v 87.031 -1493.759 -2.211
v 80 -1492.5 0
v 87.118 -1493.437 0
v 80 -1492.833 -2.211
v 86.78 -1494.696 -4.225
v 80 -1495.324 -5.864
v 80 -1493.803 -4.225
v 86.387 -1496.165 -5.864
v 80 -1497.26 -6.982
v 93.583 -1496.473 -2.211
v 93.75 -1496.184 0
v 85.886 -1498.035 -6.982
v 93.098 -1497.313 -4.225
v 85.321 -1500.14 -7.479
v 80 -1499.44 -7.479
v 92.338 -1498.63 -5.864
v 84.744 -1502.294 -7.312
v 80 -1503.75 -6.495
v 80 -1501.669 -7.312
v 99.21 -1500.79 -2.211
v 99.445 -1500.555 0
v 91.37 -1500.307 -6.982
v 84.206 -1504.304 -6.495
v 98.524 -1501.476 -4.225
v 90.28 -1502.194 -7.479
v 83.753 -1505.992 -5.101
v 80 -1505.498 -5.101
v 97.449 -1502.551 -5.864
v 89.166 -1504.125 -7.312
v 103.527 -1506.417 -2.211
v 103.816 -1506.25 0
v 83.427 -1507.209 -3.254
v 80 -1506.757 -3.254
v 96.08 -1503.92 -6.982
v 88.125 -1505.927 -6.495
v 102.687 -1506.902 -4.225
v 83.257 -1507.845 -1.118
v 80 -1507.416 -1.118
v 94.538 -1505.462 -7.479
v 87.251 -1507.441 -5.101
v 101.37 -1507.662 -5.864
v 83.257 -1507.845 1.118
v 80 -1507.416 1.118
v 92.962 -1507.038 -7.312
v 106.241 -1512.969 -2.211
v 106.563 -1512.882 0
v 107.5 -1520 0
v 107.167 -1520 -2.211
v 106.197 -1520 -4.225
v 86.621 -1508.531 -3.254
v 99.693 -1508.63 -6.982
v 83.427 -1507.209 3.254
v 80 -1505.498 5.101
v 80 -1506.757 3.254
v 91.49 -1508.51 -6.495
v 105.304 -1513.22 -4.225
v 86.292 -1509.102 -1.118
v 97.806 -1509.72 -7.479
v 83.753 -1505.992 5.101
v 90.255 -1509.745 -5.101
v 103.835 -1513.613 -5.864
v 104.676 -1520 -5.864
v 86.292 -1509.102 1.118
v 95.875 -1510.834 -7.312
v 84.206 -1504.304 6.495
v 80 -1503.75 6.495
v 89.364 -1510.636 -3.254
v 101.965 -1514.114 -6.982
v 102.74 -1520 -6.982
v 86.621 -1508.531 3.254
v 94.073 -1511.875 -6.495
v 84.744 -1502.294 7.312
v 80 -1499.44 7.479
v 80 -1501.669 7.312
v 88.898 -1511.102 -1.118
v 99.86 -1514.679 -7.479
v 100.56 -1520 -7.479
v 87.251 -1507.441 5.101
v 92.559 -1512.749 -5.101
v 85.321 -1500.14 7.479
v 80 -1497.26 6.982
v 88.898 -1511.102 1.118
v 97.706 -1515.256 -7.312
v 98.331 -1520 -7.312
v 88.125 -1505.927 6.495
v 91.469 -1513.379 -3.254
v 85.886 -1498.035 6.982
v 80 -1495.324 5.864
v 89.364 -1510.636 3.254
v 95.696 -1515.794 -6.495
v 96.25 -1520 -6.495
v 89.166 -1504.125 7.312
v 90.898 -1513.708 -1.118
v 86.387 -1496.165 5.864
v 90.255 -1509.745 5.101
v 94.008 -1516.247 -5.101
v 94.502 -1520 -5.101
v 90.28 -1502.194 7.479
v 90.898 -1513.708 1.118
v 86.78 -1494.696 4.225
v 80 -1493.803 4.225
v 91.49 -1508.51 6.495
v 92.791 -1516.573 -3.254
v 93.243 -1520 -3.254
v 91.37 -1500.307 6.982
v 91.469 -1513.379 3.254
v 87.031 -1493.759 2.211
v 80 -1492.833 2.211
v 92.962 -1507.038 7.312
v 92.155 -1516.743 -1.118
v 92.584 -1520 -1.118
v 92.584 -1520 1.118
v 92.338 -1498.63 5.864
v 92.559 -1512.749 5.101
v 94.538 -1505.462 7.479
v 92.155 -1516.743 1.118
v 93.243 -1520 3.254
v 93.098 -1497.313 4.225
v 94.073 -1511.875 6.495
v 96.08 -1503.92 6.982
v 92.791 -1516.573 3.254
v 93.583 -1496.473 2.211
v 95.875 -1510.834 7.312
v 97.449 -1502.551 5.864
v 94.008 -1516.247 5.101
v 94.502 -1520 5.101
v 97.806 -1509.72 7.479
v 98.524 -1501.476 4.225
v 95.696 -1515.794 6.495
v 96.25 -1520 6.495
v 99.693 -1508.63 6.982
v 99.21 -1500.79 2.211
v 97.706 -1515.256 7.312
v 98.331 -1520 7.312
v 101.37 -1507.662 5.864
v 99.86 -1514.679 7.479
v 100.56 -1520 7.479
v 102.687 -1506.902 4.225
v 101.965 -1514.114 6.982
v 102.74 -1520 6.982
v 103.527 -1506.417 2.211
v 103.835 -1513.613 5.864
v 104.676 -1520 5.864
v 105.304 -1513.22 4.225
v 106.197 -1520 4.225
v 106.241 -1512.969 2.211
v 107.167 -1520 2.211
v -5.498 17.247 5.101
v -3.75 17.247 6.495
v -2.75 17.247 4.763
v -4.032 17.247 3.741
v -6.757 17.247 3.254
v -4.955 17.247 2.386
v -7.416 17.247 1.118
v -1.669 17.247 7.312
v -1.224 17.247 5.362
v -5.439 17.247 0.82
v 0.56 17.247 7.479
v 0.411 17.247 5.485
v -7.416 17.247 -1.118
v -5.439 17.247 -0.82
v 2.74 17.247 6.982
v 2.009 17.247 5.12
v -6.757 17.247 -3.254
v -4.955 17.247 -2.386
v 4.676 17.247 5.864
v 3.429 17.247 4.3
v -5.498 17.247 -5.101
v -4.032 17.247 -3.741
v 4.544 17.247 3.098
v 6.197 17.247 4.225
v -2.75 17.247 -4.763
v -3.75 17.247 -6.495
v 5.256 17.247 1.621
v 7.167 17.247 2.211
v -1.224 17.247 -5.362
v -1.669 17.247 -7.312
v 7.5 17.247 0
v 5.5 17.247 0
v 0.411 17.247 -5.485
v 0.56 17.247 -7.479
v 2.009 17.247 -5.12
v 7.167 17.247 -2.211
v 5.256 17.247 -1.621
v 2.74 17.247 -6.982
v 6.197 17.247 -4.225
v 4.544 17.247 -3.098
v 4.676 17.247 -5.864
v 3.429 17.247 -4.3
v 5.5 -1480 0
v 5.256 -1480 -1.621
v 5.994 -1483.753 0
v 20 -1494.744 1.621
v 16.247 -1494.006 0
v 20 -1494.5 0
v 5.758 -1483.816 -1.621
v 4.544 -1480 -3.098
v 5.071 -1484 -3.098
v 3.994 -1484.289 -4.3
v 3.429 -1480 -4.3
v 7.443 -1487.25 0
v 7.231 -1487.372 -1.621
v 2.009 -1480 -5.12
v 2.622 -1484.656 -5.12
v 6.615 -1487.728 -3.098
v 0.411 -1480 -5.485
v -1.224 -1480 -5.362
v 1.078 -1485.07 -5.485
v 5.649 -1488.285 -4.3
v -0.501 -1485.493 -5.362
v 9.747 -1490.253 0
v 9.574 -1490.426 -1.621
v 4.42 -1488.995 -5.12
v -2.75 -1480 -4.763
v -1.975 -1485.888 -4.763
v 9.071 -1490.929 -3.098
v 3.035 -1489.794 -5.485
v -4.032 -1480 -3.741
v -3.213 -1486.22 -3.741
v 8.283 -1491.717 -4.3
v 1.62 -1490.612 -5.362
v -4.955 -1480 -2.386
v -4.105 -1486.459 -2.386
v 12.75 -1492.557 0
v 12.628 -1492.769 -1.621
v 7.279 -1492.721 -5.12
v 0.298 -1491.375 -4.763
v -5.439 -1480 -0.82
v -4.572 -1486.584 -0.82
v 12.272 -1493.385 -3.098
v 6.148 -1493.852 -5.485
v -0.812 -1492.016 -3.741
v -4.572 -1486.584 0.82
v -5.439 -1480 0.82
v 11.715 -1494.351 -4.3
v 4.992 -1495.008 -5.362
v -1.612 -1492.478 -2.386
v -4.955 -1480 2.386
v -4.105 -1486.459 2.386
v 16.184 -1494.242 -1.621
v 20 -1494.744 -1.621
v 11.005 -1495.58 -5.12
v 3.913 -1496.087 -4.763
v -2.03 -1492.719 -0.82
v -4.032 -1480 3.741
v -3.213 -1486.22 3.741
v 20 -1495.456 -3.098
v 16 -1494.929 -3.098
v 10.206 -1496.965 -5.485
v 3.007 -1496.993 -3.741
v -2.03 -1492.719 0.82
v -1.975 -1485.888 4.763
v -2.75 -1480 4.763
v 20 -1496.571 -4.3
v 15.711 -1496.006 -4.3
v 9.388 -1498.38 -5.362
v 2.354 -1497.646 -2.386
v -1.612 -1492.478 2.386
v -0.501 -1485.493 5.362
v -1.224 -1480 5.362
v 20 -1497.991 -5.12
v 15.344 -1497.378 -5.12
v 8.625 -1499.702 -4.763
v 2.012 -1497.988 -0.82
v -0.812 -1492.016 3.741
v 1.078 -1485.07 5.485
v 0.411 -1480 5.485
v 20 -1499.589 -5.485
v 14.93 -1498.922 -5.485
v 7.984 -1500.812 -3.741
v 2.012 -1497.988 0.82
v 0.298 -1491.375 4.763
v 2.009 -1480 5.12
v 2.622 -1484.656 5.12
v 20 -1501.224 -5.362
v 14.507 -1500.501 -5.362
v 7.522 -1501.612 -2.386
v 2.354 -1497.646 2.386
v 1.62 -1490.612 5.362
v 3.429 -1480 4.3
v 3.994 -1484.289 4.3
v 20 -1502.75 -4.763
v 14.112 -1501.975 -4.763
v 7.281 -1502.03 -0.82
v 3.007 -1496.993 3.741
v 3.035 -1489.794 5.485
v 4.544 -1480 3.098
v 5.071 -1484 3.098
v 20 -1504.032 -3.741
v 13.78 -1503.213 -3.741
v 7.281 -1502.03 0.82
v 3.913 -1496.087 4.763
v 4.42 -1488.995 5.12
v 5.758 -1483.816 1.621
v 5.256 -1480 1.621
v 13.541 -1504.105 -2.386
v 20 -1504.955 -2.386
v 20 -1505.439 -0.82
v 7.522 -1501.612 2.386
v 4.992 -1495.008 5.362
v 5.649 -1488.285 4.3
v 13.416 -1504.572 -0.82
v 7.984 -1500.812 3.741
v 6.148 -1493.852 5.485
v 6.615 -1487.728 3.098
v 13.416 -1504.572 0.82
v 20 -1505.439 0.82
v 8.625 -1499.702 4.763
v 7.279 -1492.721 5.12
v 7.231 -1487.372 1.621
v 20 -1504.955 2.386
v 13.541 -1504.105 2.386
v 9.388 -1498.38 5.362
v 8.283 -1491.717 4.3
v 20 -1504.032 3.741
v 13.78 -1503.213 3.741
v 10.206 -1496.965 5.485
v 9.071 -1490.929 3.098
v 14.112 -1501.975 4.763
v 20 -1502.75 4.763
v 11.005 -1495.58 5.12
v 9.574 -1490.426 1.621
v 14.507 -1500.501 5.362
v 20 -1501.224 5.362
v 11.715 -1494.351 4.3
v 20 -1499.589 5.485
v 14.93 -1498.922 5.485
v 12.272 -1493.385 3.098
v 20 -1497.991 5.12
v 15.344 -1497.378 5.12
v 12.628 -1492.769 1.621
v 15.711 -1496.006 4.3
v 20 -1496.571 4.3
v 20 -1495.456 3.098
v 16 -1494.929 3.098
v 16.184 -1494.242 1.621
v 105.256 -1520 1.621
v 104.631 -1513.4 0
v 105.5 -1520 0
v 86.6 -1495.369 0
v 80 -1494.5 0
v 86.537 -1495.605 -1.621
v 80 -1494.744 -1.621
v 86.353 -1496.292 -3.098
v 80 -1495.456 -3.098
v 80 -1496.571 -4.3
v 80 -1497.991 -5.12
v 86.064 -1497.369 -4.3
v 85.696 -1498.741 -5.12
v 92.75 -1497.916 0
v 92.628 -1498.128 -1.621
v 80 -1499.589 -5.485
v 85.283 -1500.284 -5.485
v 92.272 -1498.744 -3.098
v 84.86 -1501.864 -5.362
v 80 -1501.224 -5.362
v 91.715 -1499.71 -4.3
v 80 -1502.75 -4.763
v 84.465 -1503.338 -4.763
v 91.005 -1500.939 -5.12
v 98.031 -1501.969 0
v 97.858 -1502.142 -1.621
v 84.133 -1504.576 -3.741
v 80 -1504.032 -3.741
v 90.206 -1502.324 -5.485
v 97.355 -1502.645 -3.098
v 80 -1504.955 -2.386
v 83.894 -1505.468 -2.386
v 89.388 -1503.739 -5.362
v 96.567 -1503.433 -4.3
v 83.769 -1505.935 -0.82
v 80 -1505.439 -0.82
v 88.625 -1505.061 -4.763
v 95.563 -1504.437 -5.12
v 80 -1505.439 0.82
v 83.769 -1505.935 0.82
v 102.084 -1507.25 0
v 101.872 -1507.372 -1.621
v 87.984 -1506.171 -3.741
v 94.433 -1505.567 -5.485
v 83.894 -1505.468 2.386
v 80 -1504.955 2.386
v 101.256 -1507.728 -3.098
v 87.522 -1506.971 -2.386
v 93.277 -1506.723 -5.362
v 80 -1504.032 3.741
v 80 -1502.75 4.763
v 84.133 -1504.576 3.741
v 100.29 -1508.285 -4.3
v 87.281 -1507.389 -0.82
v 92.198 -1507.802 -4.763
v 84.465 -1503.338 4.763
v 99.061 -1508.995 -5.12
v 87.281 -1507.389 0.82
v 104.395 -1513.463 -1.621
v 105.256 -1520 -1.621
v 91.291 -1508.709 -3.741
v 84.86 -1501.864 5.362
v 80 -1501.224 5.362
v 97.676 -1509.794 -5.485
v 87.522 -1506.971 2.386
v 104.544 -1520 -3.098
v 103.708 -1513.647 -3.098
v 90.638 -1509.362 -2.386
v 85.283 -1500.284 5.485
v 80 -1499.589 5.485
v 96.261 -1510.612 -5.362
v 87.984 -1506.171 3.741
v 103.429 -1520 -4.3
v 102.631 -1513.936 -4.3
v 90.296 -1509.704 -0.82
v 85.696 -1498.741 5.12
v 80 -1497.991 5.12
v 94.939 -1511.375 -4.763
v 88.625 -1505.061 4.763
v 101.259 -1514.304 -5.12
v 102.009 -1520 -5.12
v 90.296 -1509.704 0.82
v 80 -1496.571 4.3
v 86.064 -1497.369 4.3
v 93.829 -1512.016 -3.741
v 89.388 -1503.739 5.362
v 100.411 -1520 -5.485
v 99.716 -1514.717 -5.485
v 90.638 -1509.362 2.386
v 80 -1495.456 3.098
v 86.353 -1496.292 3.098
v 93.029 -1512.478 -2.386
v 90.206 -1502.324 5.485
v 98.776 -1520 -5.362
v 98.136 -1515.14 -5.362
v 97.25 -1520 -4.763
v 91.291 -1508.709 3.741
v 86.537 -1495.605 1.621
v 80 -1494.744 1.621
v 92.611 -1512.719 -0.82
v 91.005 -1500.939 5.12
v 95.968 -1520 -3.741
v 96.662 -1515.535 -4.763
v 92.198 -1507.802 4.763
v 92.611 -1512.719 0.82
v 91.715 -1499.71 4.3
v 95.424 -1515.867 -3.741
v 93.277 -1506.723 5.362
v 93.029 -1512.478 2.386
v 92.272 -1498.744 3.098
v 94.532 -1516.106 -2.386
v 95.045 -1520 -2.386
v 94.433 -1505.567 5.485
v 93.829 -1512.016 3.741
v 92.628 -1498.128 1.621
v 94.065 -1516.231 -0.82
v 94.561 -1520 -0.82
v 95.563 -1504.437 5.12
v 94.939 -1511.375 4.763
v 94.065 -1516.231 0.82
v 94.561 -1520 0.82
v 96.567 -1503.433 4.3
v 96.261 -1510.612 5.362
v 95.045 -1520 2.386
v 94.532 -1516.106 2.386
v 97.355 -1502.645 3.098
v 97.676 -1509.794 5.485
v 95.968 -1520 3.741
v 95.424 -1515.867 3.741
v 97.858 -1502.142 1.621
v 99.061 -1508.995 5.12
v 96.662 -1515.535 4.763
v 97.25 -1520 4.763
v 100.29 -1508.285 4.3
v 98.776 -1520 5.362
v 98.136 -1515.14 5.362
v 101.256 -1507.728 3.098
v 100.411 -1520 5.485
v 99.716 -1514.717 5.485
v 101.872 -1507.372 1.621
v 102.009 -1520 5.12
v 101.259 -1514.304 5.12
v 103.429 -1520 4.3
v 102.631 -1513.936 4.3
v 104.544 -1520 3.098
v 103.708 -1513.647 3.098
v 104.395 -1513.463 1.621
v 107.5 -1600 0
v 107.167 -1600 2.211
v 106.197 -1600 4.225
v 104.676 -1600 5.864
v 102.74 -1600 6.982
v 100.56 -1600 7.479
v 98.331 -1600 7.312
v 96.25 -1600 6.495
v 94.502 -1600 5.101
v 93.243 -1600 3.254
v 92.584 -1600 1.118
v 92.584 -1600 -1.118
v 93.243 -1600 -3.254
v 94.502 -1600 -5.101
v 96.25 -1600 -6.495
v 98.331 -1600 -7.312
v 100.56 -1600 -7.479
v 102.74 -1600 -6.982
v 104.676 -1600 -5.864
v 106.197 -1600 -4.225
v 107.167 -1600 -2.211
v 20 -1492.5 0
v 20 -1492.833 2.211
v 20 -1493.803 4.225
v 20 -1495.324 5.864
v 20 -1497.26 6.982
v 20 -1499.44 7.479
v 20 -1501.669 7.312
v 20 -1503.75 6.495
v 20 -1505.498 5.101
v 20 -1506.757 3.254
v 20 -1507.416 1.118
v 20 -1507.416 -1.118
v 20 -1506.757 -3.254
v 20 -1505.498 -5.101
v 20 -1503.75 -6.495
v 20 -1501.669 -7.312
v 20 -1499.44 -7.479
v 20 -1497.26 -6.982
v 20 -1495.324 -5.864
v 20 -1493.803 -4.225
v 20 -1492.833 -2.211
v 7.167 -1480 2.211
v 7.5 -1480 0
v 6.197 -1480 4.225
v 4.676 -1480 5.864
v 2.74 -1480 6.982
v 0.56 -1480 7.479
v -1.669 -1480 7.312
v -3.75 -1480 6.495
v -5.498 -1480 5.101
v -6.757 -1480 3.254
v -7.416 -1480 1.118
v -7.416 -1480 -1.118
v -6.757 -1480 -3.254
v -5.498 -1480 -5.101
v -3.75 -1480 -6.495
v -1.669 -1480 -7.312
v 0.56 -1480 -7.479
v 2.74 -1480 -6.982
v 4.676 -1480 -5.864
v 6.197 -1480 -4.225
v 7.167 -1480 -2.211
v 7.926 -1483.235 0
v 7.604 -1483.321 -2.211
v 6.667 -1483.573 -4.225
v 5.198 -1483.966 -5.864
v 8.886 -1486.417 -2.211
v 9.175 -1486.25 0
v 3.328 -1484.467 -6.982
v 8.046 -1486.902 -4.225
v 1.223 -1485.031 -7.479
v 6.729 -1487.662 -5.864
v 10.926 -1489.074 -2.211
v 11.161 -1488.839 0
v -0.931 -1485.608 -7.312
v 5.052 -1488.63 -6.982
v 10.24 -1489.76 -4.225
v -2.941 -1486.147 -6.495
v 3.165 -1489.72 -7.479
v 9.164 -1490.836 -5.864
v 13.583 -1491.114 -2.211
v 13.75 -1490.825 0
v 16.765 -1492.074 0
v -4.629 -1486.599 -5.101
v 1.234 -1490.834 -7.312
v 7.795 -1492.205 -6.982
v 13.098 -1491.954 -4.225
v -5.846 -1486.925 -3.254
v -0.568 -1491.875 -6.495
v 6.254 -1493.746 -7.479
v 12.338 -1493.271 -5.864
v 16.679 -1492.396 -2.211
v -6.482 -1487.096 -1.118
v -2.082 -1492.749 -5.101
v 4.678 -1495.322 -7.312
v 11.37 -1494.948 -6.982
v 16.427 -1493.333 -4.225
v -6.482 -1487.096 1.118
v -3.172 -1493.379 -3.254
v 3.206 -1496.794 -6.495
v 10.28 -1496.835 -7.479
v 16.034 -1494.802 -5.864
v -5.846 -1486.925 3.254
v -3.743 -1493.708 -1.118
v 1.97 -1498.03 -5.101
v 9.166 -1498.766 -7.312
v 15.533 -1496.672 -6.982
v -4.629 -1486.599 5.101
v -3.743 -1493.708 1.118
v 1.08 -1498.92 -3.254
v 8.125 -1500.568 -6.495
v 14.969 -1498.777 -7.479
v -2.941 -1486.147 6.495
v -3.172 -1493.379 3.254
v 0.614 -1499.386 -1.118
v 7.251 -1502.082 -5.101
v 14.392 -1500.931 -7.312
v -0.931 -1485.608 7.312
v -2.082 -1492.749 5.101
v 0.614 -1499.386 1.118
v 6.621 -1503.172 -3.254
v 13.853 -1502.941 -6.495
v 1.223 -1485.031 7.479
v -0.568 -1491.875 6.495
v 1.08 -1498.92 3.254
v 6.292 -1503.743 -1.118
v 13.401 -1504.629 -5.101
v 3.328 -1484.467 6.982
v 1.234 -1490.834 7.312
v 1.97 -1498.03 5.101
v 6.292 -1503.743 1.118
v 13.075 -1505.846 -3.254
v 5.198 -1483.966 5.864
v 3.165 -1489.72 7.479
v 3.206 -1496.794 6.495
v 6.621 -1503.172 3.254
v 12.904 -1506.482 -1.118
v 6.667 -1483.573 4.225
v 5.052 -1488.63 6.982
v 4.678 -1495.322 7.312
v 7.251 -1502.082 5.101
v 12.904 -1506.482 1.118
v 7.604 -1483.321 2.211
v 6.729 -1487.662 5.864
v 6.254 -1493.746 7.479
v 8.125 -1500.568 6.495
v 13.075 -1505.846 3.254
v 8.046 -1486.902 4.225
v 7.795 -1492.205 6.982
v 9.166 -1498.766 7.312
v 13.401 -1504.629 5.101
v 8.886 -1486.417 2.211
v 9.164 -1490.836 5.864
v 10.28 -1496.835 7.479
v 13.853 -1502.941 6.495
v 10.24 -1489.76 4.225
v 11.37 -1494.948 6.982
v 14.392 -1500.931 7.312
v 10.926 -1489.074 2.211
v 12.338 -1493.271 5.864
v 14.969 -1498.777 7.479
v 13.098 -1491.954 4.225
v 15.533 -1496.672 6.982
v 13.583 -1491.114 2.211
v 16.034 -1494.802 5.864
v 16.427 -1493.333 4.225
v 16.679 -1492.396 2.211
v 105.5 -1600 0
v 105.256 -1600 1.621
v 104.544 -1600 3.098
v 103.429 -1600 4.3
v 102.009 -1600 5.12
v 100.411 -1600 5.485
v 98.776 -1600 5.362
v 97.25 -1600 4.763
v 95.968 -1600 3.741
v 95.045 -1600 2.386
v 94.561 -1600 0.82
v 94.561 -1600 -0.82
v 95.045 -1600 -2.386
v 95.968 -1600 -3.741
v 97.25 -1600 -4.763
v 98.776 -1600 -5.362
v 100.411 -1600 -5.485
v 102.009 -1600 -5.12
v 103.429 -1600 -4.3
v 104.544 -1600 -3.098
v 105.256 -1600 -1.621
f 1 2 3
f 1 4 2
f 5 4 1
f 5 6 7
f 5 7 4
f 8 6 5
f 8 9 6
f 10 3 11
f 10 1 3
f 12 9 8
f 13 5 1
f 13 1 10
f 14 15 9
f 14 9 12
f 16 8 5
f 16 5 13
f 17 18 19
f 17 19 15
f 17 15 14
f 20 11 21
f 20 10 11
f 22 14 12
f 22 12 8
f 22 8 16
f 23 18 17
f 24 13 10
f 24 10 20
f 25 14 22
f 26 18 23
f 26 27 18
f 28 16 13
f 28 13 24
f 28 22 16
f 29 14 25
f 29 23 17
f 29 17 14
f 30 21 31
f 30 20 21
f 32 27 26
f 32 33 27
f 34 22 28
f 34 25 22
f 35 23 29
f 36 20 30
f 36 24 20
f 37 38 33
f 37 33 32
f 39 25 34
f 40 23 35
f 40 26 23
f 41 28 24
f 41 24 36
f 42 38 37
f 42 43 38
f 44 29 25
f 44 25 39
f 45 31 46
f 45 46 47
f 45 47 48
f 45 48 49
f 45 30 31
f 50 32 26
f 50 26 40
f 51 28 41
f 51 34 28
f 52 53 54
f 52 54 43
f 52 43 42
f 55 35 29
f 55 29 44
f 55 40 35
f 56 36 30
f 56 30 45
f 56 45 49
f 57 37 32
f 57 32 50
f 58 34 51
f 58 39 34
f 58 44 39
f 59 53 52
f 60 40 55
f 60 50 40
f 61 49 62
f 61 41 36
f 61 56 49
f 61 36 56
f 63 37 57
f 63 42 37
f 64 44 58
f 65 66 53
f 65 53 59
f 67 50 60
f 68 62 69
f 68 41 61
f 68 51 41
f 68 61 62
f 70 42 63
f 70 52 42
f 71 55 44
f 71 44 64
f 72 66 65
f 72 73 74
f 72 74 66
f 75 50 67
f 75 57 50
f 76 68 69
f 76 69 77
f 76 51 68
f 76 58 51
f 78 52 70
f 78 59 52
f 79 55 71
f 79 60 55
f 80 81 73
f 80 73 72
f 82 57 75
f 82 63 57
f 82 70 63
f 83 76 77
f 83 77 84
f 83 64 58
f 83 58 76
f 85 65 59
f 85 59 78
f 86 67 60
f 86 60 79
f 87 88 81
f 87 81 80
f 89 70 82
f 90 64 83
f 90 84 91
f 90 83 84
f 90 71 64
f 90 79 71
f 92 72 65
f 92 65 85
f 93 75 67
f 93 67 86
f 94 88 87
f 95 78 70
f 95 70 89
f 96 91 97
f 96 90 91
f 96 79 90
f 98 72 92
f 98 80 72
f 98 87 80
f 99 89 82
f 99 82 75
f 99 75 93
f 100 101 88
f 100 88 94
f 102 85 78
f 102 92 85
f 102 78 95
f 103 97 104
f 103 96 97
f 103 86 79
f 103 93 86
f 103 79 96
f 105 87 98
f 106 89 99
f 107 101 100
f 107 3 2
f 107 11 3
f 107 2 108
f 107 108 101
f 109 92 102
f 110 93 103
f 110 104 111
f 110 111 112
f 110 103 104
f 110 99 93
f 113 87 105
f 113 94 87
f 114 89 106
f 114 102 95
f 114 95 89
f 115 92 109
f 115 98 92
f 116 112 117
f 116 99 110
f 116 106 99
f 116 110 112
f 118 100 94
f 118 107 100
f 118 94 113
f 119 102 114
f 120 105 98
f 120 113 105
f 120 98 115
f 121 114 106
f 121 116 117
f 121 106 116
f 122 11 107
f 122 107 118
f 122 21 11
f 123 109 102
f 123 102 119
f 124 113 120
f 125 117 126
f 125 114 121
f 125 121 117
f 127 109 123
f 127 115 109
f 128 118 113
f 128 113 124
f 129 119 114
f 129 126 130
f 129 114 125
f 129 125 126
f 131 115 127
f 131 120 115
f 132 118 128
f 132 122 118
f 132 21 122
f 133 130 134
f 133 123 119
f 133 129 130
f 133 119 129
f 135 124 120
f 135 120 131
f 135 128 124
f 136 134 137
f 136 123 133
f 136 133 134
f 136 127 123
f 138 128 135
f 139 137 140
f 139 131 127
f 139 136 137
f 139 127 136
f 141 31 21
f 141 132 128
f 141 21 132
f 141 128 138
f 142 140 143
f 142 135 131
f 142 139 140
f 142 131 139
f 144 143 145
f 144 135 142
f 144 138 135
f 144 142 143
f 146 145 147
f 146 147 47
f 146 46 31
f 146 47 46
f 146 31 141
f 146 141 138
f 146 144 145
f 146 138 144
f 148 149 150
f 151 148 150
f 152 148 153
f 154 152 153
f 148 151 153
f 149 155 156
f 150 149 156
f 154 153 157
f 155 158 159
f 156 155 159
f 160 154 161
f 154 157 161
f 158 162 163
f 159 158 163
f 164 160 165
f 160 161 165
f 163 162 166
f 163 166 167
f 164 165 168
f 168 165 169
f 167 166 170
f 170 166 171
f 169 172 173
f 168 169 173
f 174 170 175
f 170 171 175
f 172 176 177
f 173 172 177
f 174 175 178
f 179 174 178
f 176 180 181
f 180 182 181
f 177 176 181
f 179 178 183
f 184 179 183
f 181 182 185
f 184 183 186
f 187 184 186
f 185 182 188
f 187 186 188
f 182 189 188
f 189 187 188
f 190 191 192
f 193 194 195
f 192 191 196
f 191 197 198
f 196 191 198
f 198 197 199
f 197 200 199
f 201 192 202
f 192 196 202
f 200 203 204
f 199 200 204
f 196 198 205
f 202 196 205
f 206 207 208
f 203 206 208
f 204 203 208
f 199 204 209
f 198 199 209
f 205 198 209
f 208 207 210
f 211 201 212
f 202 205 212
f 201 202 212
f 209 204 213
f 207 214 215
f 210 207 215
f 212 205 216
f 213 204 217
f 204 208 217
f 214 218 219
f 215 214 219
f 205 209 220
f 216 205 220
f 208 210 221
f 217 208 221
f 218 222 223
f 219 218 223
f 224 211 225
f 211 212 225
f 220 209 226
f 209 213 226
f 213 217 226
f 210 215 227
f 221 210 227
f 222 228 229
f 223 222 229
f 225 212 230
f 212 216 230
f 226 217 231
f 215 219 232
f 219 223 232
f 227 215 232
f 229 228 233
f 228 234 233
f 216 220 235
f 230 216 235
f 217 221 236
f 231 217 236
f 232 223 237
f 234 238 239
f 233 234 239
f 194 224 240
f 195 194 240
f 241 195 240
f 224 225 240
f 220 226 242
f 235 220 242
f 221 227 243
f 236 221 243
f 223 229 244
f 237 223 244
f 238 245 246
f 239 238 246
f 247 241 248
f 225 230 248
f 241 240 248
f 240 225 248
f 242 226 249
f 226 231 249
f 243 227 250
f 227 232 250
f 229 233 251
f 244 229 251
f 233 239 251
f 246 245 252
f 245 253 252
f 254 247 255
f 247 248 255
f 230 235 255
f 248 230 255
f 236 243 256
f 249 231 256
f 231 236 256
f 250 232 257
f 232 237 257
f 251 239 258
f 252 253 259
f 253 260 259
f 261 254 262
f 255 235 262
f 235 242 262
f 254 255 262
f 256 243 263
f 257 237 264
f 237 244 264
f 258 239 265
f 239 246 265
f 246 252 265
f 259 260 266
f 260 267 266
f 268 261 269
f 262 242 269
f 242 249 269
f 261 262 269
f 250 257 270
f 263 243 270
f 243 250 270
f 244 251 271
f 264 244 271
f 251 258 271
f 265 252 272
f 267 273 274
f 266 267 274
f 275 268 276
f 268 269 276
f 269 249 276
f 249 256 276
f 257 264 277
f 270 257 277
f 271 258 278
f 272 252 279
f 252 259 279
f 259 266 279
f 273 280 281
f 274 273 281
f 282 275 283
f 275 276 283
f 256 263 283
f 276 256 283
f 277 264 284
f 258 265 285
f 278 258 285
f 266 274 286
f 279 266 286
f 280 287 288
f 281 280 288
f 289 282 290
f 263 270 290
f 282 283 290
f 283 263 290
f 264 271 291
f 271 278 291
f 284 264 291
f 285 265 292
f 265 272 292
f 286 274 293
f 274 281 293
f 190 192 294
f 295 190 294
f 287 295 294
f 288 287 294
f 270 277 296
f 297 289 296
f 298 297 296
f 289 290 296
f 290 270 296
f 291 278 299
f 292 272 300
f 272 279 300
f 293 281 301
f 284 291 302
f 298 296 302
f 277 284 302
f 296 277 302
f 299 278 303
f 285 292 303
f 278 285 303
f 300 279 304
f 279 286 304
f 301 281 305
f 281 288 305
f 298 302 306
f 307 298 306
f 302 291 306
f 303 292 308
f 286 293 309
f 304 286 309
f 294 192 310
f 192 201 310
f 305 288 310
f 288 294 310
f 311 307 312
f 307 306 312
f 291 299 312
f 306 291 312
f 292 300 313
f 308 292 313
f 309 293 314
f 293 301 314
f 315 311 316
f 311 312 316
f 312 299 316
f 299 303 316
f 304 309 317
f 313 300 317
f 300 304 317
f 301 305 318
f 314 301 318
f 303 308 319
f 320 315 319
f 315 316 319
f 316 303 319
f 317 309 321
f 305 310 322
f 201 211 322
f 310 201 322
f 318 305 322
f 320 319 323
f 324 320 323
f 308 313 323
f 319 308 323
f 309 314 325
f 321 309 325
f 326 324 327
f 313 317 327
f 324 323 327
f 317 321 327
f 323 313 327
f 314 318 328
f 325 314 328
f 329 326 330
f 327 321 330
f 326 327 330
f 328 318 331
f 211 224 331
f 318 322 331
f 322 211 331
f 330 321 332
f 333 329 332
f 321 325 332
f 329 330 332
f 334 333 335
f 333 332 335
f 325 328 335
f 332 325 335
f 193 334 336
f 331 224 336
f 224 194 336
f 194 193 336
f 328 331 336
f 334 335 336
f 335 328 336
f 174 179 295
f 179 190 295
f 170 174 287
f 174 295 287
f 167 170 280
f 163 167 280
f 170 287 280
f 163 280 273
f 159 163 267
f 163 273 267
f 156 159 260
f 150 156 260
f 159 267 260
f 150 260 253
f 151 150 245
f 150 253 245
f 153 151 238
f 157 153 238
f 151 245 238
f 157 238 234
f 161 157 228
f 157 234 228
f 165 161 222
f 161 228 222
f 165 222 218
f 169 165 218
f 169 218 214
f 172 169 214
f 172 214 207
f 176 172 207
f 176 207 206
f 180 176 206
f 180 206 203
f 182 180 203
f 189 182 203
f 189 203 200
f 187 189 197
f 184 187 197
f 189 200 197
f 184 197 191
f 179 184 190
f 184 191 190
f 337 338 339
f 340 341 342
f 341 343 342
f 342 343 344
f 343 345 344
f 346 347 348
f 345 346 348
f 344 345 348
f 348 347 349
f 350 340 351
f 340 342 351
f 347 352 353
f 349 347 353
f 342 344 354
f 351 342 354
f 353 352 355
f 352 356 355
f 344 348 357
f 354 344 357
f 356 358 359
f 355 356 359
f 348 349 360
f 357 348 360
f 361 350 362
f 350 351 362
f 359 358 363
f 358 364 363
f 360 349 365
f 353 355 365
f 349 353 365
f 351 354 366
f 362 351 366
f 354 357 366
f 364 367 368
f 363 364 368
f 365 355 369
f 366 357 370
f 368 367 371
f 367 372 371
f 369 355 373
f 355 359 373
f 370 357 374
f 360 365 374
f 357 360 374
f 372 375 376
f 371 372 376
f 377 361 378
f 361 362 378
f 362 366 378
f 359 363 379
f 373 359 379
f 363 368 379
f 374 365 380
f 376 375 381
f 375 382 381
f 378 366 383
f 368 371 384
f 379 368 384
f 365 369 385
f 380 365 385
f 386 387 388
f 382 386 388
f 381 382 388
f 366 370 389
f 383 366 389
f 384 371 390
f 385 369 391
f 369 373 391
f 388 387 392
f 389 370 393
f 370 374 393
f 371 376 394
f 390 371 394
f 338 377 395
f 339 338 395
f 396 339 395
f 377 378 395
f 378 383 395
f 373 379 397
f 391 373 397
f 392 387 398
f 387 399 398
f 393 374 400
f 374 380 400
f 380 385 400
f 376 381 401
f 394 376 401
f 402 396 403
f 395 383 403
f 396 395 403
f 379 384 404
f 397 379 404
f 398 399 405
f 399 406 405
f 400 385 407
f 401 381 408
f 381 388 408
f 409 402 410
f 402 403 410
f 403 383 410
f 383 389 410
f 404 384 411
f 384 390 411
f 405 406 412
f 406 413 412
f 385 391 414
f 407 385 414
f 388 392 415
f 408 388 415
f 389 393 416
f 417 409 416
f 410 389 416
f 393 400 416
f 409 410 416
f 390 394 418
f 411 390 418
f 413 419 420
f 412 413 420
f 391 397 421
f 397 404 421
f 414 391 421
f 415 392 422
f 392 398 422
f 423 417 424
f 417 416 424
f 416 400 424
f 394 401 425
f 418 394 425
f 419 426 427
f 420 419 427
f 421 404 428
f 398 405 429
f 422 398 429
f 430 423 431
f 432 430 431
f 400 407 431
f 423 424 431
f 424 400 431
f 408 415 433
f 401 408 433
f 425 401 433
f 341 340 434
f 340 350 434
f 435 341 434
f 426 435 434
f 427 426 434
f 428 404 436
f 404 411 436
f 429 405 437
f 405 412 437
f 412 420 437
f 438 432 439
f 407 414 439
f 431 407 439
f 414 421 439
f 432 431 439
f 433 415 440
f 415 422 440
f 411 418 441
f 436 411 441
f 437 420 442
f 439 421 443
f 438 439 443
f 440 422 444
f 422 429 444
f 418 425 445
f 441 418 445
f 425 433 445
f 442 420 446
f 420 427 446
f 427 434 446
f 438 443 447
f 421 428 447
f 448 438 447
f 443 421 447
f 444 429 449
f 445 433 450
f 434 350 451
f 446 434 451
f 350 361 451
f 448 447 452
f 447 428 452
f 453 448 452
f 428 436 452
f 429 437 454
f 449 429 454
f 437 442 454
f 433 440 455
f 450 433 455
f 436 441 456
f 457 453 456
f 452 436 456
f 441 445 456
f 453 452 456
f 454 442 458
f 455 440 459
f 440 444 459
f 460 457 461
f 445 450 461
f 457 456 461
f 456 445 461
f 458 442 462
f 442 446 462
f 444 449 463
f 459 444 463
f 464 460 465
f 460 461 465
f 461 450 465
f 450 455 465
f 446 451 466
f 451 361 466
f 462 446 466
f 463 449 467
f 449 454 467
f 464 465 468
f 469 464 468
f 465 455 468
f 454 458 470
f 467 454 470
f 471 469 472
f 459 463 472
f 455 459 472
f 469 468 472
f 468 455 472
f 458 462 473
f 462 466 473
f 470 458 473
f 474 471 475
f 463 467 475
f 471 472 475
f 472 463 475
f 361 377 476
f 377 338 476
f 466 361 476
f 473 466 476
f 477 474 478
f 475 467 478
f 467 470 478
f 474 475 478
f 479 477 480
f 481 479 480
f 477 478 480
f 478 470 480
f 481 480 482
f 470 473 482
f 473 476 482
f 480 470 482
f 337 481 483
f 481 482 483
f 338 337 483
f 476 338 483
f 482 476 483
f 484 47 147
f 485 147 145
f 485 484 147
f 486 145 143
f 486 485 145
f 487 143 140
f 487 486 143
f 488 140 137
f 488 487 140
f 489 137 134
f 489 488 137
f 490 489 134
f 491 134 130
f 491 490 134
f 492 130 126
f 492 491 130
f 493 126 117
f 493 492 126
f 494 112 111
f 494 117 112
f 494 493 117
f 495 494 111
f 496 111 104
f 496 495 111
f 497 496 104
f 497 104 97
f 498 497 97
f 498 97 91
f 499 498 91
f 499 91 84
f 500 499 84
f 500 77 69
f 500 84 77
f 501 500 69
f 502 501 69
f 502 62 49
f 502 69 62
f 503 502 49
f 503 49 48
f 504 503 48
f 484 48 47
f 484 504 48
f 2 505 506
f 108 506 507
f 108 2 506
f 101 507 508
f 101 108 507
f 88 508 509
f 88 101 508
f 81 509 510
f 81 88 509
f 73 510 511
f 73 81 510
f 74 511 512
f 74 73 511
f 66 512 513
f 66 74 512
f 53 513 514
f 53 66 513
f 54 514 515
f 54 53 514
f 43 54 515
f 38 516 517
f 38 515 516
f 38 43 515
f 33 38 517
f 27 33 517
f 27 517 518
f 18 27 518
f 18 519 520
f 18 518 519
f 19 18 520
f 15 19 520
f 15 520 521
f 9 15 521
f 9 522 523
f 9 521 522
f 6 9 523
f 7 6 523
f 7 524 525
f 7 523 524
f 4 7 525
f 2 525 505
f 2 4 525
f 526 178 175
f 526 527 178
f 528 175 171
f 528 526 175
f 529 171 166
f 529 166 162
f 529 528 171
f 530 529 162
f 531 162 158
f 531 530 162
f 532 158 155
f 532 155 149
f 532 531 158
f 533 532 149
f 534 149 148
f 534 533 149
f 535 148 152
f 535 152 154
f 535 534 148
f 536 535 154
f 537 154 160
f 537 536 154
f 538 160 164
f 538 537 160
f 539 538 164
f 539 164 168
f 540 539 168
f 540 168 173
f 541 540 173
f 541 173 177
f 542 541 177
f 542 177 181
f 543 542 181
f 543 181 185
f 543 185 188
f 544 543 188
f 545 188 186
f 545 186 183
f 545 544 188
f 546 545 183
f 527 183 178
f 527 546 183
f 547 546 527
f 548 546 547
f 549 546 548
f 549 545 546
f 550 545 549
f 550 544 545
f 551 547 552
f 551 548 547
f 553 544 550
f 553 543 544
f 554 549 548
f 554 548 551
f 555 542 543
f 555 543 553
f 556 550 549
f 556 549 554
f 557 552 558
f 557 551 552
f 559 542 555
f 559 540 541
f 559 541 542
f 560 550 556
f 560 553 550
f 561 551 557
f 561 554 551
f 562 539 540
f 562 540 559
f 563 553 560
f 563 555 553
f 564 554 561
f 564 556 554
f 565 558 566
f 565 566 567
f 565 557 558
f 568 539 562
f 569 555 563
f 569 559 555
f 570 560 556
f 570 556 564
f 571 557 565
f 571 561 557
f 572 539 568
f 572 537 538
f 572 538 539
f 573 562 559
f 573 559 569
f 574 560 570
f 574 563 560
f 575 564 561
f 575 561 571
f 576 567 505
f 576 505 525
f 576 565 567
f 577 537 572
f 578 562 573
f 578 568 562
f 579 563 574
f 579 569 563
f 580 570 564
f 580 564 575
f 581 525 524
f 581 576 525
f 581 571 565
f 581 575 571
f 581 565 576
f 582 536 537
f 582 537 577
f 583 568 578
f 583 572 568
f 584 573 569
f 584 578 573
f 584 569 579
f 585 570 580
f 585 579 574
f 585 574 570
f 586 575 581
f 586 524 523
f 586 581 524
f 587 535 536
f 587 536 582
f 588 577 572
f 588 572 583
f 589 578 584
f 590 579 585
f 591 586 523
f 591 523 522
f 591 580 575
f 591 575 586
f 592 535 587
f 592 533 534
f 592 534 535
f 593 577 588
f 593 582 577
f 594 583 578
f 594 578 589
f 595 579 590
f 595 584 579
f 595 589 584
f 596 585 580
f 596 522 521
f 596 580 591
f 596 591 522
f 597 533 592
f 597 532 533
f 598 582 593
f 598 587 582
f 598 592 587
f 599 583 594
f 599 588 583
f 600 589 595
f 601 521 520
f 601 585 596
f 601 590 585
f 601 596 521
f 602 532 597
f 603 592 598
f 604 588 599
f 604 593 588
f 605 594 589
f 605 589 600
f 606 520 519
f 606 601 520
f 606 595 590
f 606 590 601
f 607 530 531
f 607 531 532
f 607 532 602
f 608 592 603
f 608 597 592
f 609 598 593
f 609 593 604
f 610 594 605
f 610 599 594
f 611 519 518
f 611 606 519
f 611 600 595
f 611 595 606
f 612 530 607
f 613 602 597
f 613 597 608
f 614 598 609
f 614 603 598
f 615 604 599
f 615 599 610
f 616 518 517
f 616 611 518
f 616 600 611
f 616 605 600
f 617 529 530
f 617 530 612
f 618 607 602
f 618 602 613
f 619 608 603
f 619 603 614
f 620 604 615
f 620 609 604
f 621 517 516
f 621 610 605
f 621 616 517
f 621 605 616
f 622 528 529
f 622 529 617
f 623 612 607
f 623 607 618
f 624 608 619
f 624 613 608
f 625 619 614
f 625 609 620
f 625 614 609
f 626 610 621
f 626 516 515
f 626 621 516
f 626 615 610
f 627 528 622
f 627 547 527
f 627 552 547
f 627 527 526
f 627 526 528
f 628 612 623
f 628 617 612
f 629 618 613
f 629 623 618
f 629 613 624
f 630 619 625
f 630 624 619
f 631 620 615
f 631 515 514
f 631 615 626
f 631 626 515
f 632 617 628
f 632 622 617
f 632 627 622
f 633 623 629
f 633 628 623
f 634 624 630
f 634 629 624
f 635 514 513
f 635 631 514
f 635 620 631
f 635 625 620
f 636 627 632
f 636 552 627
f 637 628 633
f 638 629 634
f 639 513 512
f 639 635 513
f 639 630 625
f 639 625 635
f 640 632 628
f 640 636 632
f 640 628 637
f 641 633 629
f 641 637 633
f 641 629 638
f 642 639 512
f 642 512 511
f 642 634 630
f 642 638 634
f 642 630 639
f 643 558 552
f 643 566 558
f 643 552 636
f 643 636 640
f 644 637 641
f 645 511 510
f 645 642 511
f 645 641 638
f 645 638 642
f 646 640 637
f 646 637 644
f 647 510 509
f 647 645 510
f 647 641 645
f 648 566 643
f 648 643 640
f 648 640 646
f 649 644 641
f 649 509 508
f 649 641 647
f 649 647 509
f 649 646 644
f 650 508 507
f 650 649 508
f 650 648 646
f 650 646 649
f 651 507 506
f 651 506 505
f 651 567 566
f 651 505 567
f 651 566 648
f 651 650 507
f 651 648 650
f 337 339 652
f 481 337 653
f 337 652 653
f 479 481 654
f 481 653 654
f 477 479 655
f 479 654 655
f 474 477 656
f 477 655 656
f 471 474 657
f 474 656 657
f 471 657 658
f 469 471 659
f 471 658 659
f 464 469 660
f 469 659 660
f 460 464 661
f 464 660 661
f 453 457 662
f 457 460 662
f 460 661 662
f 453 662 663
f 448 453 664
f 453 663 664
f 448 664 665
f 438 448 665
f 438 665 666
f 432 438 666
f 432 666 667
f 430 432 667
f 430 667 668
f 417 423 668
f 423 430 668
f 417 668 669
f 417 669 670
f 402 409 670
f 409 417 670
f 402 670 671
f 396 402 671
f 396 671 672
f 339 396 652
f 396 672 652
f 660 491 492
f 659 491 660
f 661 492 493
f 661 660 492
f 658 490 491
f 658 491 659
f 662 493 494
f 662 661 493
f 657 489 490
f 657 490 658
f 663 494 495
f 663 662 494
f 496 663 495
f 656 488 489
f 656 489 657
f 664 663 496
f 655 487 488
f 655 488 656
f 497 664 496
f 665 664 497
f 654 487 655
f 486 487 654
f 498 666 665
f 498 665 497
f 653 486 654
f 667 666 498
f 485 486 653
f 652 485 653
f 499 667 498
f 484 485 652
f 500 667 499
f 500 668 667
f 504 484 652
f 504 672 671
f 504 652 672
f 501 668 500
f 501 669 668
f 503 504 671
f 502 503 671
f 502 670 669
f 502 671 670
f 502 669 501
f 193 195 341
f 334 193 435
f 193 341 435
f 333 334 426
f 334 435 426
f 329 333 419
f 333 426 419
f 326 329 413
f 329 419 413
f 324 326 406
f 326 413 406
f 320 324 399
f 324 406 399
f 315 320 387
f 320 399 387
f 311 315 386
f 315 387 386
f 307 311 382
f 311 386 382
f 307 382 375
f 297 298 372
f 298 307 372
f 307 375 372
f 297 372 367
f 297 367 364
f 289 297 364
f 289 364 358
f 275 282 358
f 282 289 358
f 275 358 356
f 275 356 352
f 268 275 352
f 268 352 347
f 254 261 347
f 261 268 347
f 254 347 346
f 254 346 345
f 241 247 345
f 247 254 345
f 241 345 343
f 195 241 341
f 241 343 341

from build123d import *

# Parameters (mm, degrees)
F0_R     = 7.5
F0_R_2   = 5.5
F3_DEPTH = 17.2466


with BuildPart() as f2:
    # F2: sweep along a path in F1
    with BuildLine(Plane.XY) as f2_path:
        Line((0, 0), (0, -1480))
        ThreePointArc((0, -1480), (5.8578643763, -1494.1421356237), (20, -1500))
        Line((20, -1500), (80, -1500))
        ThreePointArc((80, -1500), (94.1421356237, -1505.8578643763), (100, -1520))
        Line((100, -1520), (100, -1600))
    # F0 (on Front) → F2 (sweep)
    with BuildSketch(Plane.XZ):
        Circle(F0_R)
        Circle(F0_R_2, mode=Mode.SUBTRACT)
    sweep(path=f2_path.line)

    # F3 (add): a face of the model
    f3_faces = [f2.faces().sort_by_distance(p)[0] for p in [
        (-7.2878679656, 0, 0),
    ]]
    extrude(f3_faces, amount=F3_DEPTH)


solid = f2.part
